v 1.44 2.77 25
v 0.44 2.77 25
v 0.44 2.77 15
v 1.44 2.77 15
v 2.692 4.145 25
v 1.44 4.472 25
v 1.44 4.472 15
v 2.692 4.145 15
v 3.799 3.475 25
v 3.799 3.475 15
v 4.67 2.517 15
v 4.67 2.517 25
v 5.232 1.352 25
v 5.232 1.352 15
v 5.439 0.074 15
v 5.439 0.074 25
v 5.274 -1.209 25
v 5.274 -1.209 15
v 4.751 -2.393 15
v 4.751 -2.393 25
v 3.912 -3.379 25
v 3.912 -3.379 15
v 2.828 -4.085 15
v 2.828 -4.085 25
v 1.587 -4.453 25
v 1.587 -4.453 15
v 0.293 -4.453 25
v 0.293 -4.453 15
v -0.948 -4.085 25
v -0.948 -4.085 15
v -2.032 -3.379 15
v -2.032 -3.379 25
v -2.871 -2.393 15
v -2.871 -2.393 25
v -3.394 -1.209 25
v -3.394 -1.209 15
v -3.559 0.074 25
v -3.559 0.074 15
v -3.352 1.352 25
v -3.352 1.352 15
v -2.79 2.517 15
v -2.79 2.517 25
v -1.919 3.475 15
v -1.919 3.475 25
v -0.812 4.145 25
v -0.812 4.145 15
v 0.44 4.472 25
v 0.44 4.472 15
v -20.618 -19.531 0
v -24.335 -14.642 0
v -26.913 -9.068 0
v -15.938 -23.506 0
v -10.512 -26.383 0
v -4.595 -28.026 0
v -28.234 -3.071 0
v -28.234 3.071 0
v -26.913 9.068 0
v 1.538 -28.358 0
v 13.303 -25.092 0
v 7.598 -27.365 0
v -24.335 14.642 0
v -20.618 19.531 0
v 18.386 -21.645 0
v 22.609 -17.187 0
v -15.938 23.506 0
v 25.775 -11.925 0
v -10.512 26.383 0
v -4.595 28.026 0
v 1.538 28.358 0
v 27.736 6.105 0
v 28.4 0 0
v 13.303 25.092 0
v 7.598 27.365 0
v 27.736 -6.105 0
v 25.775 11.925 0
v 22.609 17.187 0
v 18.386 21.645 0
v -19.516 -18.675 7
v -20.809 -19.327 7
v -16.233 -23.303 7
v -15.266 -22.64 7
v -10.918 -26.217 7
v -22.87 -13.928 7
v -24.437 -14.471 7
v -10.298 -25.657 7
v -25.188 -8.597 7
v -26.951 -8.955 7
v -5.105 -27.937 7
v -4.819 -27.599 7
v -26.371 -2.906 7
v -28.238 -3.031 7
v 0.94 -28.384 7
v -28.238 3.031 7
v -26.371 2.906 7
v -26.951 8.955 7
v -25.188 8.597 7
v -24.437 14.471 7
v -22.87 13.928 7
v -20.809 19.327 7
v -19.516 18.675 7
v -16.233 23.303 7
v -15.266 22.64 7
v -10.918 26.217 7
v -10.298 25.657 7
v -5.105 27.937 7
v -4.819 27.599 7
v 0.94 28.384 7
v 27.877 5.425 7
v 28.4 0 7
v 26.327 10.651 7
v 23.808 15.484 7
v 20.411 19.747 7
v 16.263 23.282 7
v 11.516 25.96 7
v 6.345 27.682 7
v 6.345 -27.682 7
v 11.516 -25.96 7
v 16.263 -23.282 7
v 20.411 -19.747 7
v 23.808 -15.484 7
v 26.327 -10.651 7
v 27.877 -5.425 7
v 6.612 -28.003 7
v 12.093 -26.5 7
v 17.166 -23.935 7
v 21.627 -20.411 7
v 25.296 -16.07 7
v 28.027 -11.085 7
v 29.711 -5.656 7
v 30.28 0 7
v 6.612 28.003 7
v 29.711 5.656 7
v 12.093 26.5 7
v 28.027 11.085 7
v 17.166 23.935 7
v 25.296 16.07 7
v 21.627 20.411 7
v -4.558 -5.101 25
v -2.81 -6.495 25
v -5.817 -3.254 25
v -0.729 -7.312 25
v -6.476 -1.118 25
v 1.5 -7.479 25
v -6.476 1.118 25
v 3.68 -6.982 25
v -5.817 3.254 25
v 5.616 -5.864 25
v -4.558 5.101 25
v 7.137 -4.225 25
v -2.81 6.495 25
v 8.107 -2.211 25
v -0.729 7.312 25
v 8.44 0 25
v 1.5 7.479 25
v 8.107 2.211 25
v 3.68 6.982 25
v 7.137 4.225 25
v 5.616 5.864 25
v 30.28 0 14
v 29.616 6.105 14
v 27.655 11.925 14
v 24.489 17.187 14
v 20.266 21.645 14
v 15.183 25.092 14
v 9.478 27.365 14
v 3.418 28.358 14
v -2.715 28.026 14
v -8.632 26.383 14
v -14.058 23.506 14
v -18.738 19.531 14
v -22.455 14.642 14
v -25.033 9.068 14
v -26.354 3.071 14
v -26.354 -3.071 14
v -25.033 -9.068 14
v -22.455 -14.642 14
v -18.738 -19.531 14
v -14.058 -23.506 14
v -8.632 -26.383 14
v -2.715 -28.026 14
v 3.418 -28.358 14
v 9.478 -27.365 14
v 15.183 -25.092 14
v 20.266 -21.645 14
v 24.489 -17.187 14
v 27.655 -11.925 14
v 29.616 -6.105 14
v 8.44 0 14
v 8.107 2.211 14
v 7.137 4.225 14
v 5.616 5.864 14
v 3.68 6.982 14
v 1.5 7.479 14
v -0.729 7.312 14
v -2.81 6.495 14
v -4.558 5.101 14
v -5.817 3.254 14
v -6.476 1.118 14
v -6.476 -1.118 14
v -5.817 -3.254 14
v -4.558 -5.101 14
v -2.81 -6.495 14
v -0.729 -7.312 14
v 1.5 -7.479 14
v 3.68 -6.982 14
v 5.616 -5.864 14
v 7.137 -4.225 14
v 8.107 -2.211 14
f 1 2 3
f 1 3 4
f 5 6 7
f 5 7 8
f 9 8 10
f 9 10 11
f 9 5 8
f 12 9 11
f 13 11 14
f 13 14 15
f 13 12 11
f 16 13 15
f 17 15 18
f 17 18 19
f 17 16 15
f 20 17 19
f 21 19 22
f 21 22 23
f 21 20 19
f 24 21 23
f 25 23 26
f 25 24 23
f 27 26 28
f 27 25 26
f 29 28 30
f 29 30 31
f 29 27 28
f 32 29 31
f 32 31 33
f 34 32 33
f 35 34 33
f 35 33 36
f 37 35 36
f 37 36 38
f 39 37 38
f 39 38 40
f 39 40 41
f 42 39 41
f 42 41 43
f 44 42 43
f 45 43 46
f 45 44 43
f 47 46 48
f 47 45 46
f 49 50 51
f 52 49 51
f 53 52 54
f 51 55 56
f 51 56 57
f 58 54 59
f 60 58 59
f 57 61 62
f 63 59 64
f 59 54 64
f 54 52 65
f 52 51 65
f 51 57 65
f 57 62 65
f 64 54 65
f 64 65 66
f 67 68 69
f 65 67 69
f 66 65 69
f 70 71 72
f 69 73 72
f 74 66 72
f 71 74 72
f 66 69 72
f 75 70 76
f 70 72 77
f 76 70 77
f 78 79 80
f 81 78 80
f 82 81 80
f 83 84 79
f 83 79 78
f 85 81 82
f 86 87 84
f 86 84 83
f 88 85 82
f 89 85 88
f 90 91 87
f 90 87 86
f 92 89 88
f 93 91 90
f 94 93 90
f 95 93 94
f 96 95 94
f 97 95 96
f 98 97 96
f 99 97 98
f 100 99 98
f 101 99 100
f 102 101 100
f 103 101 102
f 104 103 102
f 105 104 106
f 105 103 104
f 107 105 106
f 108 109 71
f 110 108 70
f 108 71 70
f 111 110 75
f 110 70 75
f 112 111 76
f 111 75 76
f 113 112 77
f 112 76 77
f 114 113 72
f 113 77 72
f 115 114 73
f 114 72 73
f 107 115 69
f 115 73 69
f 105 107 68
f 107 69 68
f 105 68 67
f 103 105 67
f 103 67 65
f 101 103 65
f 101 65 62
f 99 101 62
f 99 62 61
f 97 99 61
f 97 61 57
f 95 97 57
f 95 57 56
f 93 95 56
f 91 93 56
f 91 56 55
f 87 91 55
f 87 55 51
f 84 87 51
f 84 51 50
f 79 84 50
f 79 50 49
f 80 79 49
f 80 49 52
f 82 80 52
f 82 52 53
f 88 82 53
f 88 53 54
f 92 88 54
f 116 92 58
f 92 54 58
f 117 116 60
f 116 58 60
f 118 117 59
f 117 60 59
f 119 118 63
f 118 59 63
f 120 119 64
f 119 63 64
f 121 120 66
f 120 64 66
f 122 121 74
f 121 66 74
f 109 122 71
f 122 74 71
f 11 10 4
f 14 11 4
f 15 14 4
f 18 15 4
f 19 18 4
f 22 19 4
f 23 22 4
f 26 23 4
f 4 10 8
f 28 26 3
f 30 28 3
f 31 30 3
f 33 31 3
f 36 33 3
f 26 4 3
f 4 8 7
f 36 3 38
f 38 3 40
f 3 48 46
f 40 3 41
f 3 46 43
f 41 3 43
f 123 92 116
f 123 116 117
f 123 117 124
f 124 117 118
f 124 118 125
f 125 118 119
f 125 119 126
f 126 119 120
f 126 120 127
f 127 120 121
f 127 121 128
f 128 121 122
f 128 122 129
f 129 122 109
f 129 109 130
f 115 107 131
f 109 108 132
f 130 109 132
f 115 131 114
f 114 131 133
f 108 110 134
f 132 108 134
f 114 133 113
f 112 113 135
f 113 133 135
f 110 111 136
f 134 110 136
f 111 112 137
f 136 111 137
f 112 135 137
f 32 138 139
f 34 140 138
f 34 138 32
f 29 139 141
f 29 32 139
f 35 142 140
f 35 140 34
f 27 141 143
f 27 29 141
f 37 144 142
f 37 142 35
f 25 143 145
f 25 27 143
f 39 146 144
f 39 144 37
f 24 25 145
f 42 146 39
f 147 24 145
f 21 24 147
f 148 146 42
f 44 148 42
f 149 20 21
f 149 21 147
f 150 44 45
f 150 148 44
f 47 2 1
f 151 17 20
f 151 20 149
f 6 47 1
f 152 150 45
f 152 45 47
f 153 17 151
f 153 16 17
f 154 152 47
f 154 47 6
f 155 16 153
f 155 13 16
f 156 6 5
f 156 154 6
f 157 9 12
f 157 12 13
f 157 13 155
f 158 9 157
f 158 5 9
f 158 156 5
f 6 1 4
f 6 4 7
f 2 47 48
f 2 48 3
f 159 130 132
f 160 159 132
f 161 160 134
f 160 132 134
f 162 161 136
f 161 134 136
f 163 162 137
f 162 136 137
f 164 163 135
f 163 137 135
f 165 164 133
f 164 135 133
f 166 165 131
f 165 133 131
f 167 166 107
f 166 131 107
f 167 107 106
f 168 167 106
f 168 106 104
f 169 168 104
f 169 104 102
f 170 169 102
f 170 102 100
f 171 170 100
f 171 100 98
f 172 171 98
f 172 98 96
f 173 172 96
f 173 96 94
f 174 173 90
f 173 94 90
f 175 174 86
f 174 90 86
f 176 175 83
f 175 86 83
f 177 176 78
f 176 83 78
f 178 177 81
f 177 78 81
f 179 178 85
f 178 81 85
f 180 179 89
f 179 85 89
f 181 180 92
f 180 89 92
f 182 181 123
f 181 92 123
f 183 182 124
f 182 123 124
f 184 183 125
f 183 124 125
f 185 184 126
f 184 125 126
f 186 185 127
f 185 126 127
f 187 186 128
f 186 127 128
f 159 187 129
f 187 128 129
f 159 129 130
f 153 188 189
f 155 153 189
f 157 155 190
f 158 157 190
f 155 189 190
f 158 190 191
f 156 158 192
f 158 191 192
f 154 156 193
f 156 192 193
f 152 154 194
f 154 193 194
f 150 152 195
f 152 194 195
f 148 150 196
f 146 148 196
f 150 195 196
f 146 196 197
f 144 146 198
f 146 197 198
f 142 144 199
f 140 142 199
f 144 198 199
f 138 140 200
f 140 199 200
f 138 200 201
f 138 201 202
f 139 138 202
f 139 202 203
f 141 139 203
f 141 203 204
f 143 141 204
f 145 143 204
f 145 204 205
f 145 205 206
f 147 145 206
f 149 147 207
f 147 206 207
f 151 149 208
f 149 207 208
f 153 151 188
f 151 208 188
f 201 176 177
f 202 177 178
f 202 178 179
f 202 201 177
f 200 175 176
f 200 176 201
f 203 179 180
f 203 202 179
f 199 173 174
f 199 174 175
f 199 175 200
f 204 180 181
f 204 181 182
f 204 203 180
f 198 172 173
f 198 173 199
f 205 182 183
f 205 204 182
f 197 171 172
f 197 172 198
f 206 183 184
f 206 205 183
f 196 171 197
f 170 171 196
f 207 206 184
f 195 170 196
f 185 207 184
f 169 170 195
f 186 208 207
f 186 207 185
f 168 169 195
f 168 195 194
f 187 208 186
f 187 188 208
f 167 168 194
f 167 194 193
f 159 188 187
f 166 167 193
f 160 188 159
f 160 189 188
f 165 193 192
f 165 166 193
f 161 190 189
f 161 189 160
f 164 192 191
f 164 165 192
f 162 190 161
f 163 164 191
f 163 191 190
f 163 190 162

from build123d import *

# Parameters (mm, degrees)
SKETCH1_R           = 28.4
BOSS_EXTRUDE1_DEPTH = 7
SKETCH2_R           = 28.4
BOSS_EXTRUDE3_DEPTH = 7
SKETCH4_R           = 7.5
BOSS_EXTRUDE4_DEPTH = 11
CUT_EXTRUDE1_DEPTH  = 10


with BuildPart() as part:
    # Sketch1 → Boss-Extrude1 (new body)
    with BuildSketch(Plane.XY):
        Circle(SKETCH1_R)
    extrude(amount=BOSS_EXTRUDE1_DEPTH)

    # Sketch2 → Boss-Extrude3 (add)
    with BuildSketch(Plane.XY.offset(7)):
        with Locations((1.88, 0)):
            Circle(SKETCH2_R)
    extrude(amount=BOSS_EXTRUDE3_DEPTH)

    # Sketch4 → Boss-Extrude4 (add)
    with BuildSketch(Plane.XY.offset(14)):
        with Locations((0.94, 0)):
            Circle(SKETCH4_R)
    extrude(amount=BOSS_EXTRUDE4_DEPTH)

    # Sketch6 → Cut-Extrude1 (cut)
    with BuildSketch(Plane.XY.offset(25)):
        with BuildLine():
            Line((0.44, 2.770056), (1.44, 2.770056))
            Line((1.44, 2.770056), (1.44, 4.472135955))
            ThreePointArc((1.44, 4.472135955), (0.94, -4.5), (0.44, 4.472135955))
            Line((0.44, 4.472135955), (0.44, 2.770056))
        make_face()
    extrude(amount=-CUT_EXTRUDE1_DEPTH, mode=Mode.SUBTRACT)


solid = part.part
